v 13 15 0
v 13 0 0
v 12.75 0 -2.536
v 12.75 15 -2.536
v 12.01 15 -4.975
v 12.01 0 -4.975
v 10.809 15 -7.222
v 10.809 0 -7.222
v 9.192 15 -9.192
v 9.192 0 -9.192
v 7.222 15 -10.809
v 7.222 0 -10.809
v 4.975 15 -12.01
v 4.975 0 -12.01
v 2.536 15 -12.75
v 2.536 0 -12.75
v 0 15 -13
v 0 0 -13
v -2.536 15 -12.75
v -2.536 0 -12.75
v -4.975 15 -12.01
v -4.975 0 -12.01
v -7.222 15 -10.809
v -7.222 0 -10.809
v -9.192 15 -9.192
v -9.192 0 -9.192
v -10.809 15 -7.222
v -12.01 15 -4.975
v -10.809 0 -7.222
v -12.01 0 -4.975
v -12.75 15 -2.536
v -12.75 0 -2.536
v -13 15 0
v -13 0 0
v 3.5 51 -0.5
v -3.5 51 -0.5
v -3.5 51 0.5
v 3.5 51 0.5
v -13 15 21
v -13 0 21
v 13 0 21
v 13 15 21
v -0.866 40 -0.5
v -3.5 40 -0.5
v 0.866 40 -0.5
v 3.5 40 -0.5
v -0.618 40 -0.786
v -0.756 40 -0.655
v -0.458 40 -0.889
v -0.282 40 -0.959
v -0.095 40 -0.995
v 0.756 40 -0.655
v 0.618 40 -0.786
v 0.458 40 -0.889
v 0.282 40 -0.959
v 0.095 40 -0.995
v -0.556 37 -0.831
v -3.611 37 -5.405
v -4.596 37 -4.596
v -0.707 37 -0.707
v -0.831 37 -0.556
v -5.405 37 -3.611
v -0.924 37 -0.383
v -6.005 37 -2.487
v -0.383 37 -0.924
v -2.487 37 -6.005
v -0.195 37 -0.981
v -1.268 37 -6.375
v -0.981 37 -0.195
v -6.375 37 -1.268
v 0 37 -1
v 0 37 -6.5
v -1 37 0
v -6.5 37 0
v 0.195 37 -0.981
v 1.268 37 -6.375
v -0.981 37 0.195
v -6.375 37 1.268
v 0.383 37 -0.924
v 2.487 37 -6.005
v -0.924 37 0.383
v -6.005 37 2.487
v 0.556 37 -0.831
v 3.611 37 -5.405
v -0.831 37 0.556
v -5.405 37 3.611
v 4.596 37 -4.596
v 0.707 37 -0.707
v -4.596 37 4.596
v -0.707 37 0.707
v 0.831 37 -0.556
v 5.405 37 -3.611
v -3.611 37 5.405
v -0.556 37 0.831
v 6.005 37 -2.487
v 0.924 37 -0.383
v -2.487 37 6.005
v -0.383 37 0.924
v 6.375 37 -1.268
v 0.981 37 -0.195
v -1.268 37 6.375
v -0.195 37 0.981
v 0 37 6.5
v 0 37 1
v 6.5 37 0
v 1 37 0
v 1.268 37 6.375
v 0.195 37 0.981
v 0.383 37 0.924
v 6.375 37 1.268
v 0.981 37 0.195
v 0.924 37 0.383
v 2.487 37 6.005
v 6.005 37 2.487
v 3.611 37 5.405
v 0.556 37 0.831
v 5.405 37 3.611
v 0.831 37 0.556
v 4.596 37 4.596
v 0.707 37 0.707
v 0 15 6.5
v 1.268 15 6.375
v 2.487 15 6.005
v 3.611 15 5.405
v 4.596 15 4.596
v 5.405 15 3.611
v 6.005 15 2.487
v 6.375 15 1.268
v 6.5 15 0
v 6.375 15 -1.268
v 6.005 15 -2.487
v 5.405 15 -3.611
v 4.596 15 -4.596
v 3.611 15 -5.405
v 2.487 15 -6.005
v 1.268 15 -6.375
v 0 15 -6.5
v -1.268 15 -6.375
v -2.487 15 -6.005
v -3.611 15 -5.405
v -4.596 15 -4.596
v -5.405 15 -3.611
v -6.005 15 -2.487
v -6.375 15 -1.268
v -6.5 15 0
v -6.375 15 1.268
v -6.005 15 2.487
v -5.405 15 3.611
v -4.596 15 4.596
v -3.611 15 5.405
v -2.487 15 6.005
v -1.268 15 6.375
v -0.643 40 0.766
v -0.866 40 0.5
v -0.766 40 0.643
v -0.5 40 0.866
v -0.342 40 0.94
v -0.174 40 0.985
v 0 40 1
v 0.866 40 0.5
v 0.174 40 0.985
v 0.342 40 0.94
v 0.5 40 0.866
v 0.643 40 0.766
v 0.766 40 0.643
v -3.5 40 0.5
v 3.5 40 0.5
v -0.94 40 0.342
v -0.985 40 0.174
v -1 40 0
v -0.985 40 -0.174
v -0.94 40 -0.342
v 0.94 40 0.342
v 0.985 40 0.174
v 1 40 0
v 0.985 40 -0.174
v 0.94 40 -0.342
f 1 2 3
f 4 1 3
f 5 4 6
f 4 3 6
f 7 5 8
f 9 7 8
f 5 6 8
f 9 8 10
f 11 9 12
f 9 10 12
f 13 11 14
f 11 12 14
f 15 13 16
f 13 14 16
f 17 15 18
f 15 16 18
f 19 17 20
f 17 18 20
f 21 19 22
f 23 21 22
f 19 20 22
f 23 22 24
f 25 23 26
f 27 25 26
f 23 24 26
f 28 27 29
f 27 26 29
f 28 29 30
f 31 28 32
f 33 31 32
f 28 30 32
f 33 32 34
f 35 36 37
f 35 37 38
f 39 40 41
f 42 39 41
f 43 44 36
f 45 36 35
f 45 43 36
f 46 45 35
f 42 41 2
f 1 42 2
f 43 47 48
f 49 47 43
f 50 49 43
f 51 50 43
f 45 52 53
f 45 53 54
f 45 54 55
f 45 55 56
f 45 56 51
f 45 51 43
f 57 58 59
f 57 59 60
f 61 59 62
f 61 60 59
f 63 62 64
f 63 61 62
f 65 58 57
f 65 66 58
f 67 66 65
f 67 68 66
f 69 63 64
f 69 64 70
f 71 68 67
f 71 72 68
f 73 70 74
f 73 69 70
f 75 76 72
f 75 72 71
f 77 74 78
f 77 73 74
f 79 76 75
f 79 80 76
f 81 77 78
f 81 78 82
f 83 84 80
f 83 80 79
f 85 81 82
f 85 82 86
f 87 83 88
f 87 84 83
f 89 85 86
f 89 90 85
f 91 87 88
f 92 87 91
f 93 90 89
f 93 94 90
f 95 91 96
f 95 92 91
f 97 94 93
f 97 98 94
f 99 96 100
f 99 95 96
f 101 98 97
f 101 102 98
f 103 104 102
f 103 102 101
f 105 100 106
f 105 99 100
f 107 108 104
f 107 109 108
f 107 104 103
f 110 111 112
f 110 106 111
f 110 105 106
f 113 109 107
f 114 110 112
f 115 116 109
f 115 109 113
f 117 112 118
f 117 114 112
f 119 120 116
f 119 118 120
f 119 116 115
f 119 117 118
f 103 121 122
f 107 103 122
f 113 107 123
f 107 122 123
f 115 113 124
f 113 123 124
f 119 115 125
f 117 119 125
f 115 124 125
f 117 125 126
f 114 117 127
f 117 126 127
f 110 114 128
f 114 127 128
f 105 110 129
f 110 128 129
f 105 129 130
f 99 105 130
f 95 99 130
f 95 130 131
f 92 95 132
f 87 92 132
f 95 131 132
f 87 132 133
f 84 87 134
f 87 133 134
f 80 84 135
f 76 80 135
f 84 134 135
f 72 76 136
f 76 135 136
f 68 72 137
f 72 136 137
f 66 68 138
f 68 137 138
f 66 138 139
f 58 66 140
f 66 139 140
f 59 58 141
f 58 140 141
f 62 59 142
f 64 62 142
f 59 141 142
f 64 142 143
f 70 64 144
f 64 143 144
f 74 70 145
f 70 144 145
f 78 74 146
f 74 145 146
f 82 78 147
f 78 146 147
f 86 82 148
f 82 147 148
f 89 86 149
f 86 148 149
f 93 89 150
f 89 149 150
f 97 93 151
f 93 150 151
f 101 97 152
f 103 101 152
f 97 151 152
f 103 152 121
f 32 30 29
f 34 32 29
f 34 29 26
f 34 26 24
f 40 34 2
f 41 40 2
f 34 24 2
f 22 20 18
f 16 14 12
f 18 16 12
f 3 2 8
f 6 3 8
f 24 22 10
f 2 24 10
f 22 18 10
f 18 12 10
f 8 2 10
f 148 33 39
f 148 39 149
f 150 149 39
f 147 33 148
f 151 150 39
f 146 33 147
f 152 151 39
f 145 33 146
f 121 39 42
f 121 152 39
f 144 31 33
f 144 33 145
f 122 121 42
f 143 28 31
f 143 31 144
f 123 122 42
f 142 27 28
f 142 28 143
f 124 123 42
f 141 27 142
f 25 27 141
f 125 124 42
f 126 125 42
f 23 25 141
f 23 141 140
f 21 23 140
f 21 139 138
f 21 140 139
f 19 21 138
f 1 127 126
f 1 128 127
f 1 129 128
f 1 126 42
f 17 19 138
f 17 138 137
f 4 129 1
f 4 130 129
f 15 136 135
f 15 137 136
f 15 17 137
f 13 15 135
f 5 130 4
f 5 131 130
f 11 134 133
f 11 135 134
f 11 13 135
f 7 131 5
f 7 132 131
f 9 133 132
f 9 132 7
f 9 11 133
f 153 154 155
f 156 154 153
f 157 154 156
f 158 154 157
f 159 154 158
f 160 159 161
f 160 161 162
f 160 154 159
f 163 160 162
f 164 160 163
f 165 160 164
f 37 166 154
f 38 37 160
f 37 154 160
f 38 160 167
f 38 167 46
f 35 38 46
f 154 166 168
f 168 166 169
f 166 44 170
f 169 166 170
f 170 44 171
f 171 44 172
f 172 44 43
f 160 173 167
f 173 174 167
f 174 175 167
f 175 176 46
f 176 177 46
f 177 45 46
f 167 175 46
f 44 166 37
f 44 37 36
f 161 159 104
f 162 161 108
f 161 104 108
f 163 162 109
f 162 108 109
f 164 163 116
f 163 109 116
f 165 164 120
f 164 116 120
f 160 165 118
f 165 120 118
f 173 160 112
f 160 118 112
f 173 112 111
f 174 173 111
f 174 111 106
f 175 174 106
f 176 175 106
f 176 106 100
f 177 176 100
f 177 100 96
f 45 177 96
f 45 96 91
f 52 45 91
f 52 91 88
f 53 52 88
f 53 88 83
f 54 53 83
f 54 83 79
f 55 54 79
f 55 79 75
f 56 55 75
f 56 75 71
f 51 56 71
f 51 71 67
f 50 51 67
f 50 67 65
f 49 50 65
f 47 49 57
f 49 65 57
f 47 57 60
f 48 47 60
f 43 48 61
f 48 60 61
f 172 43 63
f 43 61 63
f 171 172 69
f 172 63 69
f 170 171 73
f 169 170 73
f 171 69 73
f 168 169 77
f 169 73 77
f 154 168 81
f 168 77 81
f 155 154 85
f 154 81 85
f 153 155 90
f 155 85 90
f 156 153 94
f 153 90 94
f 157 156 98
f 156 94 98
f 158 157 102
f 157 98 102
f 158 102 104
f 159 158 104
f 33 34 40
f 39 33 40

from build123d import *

# Parameters (mm, degrees)
BOSS_EXTRUDE1_DEPTH = 15
SKETCH2_R           = 6.5
BOSS_EXTRUDE2_DEPTH = 22
SKETCH3_R           = 1
BOSS_EXTRUDE3_DEPTH = 3
SKETCH4_W           = 7
SKETCH4_H           = 1
BOSS_EXTRUDE4_DEPTH = 11


with BuildPart() as part:
    # Sketch1 → Boss-Extrude1 (new body)
    with BuildSketch(Plane(origin=(0, 0, 0), x_dir=(1, 0, 0), z_dir=(0, 1, 0))):
        with BuildLine():
            Line((-13, 0), (-13, -21))
            Line((-13, -21), (13, -21))
            Line((13, -21), (13, 0))
            ThreePointArc((13, 0), (0, 13), (-13, 0))
        make_face()
    extrude(amount=BOSS_EXTRUDE1_DEPTH)

    # Sketch2 → Boss-Extrude2 (add)
    with BuildSketch(Plane(origin=(0, 15, 0), x_dir=(1, 0, 0), z_dir=(0, 1, 0))):
        with Locations(Location((0, 0, 0), (0, 0, 270))):
            Circle(SKETCH2_R)
    extrude(amount=BOSS_EXTRUDE2_DEPTH)

    # Sketch3 → Boss-Extrude3 (add)
    with BuildSketch(Plane(origin=(0, 37, 0), x_dir=(1, 0, 0), z_dir=(0, 1, 0))):
        with Locations(Location((0, 0, 0), (0, 0, 270))):
            Circle(SKETCH3_R)
    extrude(amount=BOSS_EXTRUDE3_DEPTH)

    # Sketch4 → Boss-Extrude4 (add)
    with BuildSketch(Plane(origin=(0, 40, 0), x_dir=(1, 0, 0), z_dir=(0, 1, 0))):
        Rectangle(SKETCH4_W, SKETCH4_H)
    extrude(amount=BOSS_EXTRUDE4_DEPTH)


solid = part.part
